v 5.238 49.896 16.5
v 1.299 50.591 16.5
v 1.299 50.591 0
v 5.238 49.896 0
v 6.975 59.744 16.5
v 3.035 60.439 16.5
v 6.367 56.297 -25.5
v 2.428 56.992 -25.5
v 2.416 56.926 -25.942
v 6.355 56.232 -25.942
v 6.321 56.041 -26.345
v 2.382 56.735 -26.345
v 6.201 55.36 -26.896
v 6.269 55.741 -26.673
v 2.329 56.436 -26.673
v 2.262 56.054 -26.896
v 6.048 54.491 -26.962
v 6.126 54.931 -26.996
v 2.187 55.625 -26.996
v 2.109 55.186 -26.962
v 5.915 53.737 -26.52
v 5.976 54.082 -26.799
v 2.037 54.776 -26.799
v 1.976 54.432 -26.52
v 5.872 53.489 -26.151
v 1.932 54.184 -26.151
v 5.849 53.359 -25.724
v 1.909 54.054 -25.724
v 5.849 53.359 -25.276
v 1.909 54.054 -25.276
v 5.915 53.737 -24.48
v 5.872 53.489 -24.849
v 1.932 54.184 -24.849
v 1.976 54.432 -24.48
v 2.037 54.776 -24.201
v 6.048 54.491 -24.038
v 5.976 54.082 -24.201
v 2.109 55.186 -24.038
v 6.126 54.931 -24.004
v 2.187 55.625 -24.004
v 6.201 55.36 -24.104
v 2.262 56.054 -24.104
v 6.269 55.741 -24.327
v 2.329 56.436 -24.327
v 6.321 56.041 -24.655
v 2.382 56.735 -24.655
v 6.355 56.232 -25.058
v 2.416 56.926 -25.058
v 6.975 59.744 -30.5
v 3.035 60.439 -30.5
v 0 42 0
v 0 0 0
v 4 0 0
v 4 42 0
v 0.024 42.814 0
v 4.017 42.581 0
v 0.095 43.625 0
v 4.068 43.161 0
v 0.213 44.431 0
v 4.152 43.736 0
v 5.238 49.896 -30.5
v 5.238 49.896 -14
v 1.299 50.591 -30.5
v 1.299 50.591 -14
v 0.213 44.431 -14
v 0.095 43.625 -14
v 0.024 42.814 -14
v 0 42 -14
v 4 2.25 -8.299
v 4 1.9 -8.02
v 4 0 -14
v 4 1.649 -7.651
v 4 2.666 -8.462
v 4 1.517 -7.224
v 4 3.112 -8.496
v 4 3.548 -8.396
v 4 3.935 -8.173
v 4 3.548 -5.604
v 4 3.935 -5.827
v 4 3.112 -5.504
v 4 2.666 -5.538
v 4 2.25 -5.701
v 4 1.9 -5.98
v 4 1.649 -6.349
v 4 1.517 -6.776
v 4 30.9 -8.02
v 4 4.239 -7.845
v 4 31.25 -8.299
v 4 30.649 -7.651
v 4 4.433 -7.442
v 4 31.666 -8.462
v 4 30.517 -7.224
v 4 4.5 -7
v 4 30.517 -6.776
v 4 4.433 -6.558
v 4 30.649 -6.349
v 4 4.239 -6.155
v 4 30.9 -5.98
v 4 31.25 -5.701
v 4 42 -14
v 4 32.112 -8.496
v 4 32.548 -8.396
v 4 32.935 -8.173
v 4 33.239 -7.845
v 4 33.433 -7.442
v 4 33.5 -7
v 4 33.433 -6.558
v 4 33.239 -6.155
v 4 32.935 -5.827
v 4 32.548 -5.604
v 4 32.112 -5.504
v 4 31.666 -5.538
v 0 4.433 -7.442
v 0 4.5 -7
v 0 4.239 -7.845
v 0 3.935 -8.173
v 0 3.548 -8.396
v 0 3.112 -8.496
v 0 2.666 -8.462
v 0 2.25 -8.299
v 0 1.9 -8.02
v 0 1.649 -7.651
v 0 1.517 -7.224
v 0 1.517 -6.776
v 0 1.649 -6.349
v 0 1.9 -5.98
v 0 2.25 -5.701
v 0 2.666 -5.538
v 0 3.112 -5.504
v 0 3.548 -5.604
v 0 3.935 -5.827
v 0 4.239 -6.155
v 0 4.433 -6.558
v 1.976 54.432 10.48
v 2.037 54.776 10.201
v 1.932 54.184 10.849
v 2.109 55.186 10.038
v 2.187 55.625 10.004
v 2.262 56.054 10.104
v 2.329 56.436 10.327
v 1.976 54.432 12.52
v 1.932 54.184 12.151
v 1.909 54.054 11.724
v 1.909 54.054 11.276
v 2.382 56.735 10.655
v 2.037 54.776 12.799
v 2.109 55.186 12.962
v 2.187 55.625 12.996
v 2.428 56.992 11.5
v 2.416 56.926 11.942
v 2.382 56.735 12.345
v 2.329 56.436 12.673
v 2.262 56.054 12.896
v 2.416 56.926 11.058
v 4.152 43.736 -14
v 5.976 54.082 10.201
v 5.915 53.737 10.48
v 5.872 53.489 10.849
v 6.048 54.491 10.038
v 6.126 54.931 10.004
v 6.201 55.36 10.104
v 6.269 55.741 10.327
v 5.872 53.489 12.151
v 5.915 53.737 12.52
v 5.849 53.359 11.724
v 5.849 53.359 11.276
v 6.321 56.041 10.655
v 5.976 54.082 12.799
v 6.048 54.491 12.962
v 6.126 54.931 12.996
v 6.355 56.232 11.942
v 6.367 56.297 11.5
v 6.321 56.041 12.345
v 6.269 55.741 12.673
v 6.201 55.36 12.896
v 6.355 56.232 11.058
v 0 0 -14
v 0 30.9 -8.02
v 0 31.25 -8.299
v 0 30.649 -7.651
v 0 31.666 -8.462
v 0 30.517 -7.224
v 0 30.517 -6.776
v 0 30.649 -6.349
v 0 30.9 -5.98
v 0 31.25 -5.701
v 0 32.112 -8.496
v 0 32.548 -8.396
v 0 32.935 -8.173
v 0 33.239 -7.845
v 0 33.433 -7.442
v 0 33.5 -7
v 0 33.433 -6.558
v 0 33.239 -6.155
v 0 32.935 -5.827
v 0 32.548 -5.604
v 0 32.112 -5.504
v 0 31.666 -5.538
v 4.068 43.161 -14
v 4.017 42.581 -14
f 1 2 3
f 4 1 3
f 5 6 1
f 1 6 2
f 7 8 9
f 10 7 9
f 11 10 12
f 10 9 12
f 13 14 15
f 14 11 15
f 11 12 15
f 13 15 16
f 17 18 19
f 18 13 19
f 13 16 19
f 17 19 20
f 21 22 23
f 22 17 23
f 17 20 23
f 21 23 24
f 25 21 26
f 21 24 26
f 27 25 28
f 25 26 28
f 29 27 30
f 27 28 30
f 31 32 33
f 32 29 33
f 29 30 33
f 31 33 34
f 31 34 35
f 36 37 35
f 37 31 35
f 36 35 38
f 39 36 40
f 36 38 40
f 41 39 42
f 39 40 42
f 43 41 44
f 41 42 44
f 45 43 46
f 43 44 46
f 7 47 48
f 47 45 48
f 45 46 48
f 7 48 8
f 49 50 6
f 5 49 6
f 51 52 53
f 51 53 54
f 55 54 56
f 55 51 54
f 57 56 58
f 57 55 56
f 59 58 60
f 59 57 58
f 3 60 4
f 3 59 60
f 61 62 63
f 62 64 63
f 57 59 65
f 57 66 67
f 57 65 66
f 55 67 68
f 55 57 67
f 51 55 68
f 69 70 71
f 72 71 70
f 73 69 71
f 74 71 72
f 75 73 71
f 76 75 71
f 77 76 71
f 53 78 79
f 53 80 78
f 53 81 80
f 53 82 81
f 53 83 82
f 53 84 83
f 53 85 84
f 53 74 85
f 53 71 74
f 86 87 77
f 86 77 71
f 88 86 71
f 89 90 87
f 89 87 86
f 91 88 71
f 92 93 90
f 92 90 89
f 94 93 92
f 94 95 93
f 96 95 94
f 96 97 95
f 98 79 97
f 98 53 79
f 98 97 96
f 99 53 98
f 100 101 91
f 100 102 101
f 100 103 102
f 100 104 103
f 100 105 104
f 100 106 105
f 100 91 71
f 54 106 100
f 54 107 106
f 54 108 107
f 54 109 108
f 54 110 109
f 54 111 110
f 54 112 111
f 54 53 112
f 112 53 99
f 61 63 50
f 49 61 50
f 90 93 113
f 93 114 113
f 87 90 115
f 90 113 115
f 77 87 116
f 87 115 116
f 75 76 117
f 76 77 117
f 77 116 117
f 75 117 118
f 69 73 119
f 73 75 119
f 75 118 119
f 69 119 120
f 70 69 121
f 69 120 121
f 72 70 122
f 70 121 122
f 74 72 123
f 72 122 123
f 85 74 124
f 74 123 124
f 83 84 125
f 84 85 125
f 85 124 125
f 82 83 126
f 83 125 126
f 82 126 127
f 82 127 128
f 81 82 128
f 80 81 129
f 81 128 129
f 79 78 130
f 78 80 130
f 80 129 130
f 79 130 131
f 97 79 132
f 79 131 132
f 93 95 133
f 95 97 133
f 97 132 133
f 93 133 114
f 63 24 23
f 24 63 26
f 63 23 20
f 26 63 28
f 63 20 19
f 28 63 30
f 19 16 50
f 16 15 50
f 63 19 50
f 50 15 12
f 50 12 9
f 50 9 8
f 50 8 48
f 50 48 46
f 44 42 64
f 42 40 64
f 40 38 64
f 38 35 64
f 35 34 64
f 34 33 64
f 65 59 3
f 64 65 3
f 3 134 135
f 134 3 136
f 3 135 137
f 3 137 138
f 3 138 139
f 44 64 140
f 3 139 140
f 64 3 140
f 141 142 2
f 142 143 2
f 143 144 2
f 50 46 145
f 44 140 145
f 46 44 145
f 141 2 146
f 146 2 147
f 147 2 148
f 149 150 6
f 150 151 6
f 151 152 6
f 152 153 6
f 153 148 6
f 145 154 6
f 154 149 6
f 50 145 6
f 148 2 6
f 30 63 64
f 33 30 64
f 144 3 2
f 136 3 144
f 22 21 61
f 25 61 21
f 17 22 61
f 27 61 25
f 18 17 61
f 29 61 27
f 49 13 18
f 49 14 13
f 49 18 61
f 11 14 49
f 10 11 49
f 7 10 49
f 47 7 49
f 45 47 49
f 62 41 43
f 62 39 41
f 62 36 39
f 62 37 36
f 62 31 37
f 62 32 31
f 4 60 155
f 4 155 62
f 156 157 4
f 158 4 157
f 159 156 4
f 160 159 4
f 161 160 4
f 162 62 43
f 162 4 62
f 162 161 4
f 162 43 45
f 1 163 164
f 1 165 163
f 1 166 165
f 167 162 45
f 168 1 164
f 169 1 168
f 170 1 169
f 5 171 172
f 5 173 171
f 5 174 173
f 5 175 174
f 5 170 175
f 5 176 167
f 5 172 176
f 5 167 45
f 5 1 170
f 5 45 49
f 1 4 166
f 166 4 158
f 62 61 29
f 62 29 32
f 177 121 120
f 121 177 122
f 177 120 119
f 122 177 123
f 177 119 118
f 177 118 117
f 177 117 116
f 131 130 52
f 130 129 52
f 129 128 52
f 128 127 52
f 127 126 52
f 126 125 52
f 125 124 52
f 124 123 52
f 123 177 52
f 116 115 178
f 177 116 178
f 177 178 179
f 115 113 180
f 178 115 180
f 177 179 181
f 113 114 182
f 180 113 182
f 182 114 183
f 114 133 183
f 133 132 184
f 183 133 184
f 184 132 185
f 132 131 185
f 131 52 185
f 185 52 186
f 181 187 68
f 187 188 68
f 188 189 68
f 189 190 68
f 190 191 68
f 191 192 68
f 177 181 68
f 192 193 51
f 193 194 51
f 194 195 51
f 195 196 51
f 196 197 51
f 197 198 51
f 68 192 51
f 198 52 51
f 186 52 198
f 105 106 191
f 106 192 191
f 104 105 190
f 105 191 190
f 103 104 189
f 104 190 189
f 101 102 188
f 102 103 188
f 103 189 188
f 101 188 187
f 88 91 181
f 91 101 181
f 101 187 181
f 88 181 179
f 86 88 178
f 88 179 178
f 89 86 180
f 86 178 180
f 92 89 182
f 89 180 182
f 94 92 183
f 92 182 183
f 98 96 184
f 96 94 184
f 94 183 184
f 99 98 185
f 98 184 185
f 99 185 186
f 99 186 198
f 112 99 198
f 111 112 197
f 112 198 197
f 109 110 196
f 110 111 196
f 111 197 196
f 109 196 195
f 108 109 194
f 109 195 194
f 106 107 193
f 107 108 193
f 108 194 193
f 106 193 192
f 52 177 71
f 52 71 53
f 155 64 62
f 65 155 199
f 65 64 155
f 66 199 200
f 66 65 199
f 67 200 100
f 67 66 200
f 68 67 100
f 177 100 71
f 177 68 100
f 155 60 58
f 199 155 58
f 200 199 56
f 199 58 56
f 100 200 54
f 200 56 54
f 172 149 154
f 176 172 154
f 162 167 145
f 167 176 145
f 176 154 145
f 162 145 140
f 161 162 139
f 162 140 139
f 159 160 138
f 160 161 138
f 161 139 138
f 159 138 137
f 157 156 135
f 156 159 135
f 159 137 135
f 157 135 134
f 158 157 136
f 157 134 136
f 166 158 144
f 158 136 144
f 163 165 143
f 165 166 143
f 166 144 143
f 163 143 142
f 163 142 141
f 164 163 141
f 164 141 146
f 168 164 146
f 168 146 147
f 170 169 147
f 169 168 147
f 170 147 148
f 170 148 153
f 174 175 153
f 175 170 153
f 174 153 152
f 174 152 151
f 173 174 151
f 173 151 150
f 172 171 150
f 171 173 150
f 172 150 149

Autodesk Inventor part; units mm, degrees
ref_plane "YZ Plane" through (0, 0, 0) normal (1, 0, 0) x (0, 1, 0)
ref_plane "XZ Plane" through (0, 0, 0) normal (0, 1, 0) x (-1, 0, 0)
ref_plane "XY Plane" through (0, 0, 0) normal (0, 0, 1) x (1, 0, 0)
sketch "스케치1" plane through (0, 0, 0) normal (1, 0, 0) x (0, 1, 0)
  line L0 (0, 0) -> (50, 0)
  line L1 (50, 0) -> (50, -14)
  line L2 (50, -14) -> (0, -14)
  line L3 (0, -14) -> (0, 0)
  circle A0 centre (32, -7) radius 1.5
  circle A1 centre (3, -7) radius 1.5
  line L4 (60, 16.5) -> (50, 16.5)
  line L5 (50, 16.5) -> (50, -30.5)
  line L6 (50, -30.5) -> (60, -30.5)
  line L7 (60, -30.5) -> (60, 16.5)
  circle A2 centre (55, 11.5) radius 1.5
  circle A3 centre (55, -25.5) radius 1.5
  point P0 (50, -7)
  dimension "d0" = 50
  dimension "d1" = 14
  dimension "d2" = 3
  dimension "d3" = 3
  dimension "d4" = 29
  dimension "d5" = 7
  dimension "d6" = 7
  dimension "d10" = 3
  dimension "d11" = 10
  dimension "d12" = 47
  dimension "d13" = 3
  dimension "d14" = 3
  dimension "d15" = 37
  dimension "d16" = 5
  dimension "d17" = 5
  dimension "d18" = 5
extrude "돌출2" add sketch "스케치1" along normal blind 4
sketch "스케치2" plane through (4, 0, 0) normal (1, 0, 0) x (0, 0, -1)
  circle A0 centre (7, 3) radius 1.5 projected
  circle A1 centre (7, 32) radius 1.5 projected
  circle A2 centre (25.5, 55) radius 1.5 projected
  circle A3 centre (-11.5, 55) radius 1.5 projected
  line L0 (-16.5, 50) -> (0, 50) projected
  line L1 (0, 50) -> (0, 0) projected
  line L2 (0, 0) -> (14, 0) projected
  line L3 (14, 0) -> (14, 50) projected
  line L4 (14, 50) -> (30.5, 50) projected
  line L5 (30.5, 50) -> (30.5, 60) projected
  line L6 (30.5, 60) -> (-16.5, 60) projected
  line L7 (-16.5, 60) -> (-16.5, 50) projected
  line L8 (0, 50) -> (0, 0) projected
  line L9 (0, 42) -> (14, 42)
  line L10 (14, 0) -> (14, 50) projected
  dimension "d21" = 10
bend part "굽힘1" radius 10 angle 10 line through (4, 42, 0) along (0, 0, -1) centre toward (1, 0, 0) moving side (0, 1, 0) both sides no
properties part number "옆면PSD받침대" material "ABS 플라스틱"
